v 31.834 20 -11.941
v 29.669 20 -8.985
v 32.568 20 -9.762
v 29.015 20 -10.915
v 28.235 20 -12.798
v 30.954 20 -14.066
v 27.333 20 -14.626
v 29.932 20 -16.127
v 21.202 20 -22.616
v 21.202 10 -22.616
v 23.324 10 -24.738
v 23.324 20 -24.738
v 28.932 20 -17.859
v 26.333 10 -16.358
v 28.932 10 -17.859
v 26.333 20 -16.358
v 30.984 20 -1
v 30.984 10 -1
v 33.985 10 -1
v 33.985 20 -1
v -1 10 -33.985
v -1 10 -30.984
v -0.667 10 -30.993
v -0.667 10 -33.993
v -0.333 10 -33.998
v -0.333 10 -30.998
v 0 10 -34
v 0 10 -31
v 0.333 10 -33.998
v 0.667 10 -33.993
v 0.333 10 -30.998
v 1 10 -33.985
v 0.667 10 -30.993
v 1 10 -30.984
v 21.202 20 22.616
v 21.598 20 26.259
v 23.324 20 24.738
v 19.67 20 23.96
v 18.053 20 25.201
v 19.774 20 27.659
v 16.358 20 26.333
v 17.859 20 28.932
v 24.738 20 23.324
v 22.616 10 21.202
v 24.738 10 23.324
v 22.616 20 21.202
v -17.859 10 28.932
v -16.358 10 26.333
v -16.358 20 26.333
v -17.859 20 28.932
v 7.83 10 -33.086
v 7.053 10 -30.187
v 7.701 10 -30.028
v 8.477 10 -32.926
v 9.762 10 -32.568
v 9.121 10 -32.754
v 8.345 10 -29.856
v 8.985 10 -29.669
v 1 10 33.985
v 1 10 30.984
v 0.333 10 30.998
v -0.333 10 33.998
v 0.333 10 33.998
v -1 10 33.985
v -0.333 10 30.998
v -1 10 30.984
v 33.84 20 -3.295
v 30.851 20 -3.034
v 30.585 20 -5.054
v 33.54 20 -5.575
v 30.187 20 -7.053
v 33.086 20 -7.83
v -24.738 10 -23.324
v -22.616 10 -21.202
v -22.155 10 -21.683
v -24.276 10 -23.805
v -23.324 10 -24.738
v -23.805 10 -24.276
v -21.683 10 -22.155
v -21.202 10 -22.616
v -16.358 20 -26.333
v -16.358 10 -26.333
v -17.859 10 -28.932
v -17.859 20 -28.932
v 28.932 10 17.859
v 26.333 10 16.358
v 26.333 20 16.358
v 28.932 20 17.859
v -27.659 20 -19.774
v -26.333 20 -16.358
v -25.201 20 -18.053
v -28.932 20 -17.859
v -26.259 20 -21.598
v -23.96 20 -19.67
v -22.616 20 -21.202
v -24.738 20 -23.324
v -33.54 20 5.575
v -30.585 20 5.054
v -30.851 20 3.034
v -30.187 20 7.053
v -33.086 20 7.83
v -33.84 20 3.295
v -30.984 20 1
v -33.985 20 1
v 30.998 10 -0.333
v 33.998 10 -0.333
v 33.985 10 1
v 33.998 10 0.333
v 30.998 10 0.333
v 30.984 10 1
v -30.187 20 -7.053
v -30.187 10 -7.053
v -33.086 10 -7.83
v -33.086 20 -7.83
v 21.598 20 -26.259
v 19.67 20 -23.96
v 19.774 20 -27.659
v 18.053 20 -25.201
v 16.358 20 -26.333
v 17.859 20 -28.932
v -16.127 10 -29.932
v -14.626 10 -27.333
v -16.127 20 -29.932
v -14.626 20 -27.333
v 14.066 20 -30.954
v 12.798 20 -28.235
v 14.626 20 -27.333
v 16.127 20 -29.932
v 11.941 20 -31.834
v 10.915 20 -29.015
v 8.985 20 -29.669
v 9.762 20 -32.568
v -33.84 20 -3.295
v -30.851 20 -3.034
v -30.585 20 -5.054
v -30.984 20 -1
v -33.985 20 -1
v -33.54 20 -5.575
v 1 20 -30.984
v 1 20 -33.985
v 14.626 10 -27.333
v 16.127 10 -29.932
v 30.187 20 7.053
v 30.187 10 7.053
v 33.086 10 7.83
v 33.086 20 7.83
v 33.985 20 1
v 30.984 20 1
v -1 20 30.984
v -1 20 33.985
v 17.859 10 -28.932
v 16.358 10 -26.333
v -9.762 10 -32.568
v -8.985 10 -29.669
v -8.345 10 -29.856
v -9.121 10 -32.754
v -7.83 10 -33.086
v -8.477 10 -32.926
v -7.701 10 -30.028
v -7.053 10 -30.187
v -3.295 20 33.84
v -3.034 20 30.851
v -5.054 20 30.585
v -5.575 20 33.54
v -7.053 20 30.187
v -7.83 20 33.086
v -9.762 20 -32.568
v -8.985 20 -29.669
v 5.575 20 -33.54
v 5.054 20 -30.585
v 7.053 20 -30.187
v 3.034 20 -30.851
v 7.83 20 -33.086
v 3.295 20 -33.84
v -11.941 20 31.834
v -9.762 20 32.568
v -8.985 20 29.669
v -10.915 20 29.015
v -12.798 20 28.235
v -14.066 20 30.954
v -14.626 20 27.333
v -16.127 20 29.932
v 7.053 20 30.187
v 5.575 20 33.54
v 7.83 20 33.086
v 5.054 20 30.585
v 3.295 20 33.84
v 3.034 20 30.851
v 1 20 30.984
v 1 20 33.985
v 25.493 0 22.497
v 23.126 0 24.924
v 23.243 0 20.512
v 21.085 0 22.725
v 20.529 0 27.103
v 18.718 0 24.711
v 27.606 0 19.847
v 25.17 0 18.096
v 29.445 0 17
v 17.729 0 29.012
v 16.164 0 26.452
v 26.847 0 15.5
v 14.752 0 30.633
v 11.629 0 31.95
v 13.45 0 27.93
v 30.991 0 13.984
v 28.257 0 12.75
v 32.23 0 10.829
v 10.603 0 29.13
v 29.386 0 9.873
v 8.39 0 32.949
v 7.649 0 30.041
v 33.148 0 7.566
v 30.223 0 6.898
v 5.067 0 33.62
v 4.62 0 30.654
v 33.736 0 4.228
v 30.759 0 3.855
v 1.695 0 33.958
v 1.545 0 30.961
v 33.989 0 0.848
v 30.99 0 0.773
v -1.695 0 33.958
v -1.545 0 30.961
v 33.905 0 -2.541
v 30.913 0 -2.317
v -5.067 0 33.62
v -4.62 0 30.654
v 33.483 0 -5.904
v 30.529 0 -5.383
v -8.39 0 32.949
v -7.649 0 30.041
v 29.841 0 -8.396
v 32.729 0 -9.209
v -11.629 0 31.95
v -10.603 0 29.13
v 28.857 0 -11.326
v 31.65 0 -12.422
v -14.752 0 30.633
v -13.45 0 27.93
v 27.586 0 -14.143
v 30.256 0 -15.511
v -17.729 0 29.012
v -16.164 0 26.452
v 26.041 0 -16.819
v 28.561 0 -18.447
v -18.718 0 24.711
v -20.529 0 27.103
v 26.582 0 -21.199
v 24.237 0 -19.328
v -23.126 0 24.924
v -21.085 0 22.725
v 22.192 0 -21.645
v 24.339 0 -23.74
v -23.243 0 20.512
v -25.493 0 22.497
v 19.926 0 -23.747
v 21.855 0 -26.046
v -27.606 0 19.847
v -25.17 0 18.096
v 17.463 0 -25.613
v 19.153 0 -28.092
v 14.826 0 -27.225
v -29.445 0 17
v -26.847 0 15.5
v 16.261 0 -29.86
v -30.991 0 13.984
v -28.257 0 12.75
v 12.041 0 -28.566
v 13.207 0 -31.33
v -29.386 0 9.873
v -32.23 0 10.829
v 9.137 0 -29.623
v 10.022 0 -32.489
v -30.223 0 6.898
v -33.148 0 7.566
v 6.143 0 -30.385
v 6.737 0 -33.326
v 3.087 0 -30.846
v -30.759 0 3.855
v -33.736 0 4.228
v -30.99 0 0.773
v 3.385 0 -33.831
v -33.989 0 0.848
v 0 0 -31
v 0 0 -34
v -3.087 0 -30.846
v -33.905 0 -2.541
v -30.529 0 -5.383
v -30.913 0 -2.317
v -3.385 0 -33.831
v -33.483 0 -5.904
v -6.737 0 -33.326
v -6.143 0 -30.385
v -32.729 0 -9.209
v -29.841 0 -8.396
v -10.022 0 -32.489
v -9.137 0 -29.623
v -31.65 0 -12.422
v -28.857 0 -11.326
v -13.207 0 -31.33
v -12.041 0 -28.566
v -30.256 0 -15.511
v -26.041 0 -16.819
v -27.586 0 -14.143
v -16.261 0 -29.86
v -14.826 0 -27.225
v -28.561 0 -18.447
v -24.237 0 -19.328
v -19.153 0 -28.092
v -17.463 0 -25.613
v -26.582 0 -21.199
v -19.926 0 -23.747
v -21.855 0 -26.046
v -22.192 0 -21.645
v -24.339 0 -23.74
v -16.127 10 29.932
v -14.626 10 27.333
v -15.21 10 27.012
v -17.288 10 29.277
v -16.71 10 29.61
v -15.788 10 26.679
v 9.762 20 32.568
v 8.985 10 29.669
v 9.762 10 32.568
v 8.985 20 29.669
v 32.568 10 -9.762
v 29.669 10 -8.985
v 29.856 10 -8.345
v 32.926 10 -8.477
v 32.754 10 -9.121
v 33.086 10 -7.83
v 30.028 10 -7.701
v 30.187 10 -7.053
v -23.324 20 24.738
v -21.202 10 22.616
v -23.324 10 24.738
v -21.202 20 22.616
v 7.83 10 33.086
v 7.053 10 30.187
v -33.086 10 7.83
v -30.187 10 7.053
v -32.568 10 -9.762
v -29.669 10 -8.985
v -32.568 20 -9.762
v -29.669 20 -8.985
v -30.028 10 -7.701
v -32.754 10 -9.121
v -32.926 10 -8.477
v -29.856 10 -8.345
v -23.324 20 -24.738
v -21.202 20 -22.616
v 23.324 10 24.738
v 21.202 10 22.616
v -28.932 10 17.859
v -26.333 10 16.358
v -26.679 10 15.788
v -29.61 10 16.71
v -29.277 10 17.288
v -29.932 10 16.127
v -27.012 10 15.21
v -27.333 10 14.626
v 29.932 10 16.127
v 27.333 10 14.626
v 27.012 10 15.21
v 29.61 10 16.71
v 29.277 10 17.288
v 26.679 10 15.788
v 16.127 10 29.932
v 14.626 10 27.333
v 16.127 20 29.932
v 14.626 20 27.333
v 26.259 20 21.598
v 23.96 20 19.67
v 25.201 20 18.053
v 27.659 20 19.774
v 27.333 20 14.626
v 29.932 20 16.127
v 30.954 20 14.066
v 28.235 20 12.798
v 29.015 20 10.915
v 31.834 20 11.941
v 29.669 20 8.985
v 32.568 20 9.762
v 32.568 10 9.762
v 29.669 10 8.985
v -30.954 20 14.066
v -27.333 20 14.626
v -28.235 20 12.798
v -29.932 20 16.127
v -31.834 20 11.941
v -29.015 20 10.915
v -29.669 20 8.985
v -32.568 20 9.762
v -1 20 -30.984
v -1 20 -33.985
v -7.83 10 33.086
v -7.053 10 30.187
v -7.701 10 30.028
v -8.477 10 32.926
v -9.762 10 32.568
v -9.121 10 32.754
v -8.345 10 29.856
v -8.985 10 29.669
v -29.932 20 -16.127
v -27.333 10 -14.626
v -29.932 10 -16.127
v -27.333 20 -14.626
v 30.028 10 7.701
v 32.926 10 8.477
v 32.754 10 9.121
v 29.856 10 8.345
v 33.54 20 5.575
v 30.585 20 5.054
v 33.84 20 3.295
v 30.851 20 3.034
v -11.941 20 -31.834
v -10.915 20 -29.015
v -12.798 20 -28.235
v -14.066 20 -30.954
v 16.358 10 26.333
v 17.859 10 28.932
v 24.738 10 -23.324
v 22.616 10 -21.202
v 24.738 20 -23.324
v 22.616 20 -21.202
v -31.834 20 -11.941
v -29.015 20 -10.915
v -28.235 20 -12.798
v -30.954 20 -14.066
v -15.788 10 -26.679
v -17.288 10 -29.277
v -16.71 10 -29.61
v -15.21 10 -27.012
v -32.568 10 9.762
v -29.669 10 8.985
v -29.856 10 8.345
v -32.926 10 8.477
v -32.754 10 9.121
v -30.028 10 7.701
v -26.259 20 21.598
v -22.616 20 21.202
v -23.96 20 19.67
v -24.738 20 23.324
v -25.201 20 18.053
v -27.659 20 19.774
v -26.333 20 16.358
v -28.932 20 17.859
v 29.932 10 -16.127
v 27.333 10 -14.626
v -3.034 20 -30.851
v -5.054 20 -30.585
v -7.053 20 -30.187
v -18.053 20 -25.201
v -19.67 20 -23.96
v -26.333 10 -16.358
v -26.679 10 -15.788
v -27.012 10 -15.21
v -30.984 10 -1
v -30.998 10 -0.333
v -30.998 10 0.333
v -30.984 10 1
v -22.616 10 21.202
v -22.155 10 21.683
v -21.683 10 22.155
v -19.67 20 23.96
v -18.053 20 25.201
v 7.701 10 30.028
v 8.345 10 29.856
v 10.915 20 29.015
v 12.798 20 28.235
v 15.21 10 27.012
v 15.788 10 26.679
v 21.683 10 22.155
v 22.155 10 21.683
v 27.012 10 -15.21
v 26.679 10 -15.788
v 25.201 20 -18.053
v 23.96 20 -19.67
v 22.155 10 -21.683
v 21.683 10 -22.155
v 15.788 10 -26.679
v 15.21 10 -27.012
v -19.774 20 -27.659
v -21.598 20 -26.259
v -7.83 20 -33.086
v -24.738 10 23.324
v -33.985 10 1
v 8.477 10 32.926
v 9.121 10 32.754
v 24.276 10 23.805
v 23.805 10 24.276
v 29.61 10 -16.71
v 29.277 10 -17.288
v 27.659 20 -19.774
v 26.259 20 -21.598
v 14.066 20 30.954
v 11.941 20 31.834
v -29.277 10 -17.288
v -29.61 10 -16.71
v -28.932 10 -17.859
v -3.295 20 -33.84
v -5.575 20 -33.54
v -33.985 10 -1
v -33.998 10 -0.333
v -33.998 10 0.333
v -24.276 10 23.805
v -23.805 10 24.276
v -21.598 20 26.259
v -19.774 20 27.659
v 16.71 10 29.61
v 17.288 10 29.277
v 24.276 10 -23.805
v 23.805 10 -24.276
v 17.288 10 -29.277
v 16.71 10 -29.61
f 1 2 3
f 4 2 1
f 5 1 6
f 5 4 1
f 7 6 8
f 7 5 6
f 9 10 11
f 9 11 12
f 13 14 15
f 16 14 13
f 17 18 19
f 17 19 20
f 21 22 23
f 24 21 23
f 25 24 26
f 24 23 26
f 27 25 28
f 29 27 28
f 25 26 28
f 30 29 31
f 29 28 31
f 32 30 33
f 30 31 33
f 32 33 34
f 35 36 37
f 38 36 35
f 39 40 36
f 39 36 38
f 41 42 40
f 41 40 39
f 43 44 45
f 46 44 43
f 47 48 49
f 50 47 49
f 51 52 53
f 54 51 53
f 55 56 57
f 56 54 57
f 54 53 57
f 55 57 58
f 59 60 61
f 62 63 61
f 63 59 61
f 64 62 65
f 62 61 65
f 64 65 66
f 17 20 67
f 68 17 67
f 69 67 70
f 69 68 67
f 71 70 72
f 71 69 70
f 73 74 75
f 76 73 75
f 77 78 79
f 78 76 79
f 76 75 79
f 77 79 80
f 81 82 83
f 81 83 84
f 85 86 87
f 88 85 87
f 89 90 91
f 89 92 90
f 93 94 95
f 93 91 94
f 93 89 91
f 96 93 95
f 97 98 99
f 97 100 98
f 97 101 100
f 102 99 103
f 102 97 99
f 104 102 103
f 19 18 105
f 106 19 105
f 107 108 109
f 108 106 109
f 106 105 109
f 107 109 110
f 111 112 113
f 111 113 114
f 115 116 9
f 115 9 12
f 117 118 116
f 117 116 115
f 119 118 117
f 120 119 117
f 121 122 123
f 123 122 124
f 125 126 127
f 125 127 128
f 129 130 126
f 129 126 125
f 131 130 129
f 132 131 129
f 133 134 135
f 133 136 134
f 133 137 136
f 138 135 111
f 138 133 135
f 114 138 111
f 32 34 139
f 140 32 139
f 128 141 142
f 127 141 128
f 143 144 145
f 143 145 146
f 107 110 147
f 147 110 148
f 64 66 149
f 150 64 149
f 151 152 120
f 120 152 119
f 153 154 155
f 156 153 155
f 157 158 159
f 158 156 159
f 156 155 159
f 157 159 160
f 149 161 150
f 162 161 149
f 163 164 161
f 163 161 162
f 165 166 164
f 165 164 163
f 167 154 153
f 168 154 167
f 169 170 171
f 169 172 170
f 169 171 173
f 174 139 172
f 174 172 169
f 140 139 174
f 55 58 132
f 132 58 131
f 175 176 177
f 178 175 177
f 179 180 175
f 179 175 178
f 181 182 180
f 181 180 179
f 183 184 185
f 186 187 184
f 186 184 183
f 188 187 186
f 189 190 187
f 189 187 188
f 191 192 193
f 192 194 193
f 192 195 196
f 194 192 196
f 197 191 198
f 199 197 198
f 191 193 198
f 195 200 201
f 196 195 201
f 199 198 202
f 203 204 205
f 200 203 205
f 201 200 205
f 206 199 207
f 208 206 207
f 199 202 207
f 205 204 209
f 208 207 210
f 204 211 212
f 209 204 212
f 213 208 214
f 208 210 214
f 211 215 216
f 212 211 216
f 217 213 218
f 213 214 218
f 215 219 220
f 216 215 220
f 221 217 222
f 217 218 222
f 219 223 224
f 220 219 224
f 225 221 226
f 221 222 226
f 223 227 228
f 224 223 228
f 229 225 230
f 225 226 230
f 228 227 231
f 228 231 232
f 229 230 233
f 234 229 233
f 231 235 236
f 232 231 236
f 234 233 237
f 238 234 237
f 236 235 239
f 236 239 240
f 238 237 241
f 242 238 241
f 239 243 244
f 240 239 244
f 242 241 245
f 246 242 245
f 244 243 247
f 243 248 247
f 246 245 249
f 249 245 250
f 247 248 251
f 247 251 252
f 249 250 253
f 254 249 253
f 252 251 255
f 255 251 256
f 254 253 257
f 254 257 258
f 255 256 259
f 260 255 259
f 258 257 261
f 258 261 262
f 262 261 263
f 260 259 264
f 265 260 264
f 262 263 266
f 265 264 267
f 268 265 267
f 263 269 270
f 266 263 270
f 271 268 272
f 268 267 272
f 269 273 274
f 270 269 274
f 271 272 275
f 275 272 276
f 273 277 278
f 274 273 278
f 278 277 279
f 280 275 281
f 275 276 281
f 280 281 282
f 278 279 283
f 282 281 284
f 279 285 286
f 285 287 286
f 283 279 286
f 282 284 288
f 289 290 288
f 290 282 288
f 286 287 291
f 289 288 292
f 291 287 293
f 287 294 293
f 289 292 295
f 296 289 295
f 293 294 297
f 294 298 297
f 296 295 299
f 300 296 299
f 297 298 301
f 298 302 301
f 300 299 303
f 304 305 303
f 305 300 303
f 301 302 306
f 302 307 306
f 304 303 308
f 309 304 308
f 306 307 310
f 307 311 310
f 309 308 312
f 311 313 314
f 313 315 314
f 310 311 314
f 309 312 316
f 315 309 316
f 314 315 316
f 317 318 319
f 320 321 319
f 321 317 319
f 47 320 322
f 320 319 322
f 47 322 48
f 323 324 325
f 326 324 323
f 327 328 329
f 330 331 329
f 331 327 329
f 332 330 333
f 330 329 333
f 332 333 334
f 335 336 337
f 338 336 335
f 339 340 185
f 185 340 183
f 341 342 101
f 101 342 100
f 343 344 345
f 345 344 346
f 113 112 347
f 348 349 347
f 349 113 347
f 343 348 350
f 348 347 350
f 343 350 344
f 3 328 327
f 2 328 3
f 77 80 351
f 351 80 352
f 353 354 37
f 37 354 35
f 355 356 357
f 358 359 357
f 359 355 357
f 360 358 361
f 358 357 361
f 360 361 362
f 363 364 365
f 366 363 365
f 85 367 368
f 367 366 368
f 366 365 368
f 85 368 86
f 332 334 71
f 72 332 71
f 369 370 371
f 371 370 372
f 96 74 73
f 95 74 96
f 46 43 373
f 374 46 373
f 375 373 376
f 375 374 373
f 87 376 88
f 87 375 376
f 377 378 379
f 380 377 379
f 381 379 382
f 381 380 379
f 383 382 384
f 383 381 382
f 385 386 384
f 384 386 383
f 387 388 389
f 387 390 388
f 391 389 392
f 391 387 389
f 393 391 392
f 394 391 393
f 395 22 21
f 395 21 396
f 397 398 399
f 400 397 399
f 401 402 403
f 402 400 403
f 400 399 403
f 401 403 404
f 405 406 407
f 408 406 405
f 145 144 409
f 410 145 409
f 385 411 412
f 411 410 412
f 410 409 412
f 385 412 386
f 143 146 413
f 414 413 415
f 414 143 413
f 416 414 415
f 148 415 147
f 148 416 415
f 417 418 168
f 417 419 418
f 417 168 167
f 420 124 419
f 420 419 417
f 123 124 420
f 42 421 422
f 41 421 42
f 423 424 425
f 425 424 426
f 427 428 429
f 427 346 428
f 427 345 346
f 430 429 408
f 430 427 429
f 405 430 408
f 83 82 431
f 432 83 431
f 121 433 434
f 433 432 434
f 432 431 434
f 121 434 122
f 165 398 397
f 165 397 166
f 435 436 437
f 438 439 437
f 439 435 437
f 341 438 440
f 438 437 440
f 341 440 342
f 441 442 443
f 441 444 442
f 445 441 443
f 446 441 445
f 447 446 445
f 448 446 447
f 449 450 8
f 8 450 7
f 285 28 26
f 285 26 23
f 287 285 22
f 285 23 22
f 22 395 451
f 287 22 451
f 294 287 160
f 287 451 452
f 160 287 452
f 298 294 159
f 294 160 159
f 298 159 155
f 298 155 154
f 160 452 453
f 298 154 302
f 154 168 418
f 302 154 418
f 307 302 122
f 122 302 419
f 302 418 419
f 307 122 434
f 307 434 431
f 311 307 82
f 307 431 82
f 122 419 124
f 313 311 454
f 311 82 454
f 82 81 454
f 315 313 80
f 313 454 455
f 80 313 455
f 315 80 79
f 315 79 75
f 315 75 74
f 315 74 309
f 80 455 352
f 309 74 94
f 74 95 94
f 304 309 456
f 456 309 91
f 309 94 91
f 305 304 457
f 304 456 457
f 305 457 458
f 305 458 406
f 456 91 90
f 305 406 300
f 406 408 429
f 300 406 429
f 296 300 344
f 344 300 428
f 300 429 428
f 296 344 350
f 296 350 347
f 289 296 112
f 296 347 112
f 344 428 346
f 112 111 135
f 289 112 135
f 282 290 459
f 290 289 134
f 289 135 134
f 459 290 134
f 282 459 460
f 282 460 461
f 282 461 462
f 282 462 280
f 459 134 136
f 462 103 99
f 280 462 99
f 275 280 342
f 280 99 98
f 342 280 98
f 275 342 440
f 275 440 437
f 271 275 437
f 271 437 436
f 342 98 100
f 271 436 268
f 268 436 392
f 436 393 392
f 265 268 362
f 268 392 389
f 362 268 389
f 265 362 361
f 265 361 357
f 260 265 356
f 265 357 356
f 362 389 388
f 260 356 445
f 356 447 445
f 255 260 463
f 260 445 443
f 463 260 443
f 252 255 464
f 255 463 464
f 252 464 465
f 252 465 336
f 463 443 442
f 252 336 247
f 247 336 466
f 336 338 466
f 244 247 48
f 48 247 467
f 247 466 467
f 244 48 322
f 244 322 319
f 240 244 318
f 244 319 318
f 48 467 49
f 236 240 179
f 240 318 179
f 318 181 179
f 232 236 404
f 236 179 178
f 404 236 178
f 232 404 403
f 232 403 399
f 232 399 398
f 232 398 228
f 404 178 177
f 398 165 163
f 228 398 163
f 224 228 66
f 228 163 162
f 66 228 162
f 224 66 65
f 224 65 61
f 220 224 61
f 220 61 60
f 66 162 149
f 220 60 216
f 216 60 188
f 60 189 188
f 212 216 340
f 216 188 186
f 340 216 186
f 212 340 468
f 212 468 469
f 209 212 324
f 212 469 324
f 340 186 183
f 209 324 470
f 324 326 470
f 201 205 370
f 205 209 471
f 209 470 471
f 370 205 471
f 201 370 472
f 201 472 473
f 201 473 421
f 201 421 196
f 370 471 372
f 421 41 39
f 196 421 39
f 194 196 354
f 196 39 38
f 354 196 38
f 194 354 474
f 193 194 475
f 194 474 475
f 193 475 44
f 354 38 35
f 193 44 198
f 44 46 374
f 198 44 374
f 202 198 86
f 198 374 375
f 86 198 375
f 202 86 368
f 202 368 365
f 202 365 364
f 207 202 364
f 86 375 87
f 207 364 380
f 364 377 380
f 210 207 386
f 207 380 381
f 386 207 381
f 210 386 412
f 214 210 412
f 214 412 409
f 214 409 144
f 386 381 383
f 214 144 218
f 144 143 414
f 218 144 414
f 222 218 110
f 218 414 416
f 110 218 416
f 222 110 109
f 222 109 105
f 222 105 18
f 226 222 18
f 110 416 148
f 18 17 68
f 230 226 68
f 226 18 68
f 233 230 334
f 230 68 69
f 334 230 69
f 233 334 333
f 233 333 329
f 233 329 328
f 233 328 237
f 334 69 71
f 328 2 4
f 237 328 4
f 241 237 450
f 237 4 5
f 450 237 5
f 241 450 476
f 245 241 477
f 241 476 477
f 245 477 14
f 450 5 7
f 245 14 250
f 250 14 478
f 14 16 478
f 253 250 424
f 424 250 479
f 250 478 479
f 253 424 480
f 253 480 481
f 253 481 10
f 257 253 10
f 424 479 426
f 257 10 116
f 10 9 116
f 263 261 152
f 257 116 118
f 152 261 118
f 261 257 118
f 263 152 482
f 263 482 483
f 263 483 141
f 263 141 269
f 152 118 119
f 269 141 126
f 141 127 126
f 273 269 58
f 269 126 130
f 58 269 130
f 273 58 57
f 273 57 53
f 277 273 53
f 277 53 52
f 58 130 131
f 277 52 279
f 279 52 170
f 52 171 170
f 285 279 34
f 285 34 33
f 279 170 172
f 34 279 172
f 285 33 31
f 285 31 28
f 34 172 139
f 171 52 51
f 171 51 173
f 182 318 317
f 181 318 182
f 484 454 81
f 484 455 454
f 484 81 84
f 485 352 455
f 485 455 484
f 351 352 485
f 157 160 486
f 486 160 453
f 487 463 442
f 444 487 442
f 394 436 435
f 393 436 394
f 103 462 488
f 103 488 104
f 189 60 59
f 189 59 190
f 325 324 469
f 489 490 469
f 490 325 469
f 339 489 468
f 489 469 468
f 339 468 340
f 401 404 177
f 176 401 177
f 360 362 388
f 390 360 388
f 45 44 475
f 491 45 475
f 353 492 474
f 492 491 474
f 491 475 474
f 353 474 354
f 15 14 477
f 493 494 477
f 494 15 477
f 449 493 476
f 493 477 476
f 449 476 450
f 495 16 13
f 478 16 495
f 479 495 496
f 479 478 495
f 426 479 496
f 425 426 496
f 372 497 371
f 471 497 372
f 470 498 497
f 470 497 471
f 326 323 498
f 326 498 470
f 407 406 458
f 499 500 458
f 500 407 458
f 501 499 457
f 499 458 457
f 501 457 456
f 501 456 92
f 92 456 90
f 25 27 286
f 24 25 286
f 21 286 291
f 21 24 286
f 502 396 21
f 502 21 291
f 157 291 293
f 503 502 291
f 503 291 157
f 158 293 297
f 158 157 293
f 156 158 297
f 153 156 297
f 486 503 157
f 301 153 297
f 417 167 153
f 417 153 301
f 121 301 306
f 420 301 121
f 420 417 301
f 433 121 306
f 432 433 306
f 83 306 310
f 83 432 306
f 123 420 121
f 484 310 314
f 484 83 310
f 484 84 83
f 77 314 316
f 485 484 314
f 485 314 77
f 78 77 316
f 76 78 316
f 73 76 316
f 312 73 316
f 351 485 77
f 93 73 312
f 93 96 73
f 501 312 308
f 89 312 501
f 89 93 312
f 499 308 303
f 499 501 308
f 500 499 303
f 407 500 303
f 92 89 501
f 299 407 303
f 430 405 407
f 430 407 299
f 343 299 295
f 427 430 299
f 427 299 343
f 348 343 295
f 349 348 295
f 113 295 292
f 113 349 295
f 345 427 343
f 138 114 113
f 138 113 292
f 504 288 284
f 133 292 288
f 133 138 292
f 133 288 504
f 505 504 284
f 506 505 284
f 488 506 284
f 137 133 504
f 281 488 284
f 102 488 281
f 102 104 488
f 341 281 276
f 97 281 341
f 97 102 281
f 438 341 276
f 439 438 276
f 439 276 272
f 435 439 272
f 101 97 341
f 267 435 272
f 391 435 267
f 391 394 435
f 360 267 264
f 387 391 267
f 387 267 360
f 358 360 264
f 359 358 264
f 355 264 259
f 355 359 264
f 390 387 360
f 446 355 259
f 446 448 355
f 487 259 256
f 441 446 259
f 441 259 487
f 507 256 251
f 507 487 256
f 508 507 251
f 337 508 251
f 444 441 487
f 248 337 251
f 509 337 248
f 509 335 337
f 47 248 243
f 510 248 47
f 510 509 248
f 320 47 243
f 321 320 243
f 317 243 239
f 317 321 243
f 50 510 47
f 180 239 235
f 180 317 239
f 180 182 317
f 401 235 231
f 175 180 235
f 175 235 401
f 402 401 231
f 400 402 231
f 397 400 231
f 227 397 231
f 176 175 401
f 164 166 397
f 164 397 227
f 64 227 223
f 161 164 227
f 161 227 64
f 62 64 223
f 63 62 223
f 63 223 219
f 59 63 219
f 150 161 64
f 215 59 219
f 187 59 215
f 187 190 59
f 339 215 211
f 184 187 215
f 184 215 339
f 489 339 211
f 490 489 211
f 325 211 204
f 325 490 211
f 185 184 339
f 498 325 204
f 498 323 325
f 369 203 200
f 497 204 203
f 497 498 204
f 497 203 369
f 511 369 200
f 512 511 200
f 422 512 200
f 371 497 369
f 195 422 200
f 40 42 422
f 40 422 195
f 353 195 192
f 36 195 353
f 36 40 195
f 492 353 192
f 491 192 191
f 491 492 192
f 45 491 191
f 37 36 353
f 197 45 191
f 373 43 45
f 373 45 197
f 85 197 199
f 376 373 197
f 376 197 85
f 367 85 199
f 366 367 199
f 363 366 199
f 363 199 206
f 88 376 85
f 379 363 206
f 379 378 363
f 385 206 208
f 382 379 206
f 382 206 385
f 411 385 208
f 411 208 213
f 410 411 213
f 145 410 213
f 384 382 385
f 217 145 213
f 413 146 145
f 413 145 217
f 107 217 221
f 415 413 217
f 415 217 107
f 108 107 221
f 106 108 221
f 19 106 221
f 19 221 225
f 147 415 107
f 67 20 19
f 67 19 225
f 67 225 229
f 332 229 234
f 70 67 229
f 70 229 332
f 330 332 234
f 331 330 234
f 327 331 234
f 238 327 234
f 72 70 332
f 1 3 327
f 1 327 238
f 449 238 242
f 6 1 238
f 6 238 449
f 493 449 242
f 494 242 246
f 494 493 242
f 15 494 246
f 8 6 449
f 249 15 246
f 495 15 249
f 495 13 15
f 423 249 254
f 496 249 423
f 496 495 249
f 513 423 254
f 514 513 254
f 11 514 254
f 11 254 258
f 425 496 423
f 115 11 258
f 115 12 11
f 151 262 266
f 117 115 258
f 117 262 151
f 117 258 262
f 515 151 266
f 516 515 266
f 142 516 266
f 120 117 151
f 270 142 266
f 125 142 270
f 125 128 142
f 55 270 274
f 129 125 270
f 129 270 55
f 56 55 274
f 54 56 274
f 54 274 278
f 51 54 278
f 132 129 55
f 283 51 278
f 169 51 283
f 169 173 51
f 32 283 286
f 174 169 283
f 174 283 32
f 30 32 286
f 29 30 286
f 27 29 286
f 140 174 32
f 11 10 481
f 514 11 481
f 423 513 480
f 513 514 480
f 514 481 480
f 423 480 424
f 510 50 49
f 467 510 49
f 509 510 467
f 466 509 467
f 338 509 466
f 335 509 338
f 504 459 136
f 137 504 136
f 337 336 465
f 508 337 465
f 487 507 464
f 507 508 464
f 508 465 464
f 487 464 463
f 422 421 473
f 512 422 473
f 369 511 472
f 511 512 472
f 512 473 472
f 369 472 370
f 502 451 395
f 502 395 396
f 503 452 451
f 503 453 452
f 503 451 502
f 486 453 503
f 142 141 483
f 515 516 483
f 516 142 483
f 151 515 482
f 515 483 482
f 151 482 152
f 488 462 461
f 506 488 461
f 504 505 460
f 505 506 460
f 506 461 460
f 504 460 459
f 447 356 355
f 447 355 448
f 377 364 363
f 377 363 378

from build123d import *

# Parameters (mm, degrees)
SKETCH1_W          = 3
SKETCH1_H          = 20
SKETCH2_W          = 2
SKETCH2_H          = 38.722689076
CUT_EXTRUDE1_DEPTH = 40
CIRPATTERN1_COUNT  = 24


with BuildPart() as part:
    # Sketch1 → Revolve1 (revolve)
    with BuildSketch(Plane.XY, mode=Mode.PRIVATE) as revolve1_sk:
        with Locations((-32.5, 10)):
            Rectangle(SKETCH1_W, SKETCH1_H)
    revolve(revolve1_sk.sketch.rotate(Axis((0, -1.909188309, 0), (0, 1, 0)), 270), axis=Axis((0, -1.909188309, 0), (0, 1, 0)))

    # Sketch2 → Cut-Extrude1 (cut)
    with BuildSketch(Plane.XY):
        with Locations((0, 29.361344538)):
            Rectangle(SKETCH2_W, SKETCH2_H)
    cut_extrude1 = extrude(amount=-CUT_EXTRUDE1_DEPTH, mode=Mode.SUBTRACT)

    # CirPattern1: Cut-Extrude1 ×24 about axis
    cirpattern1_axis = Axis((0, 0, 0), (0, 1, 0))
    for i in range(1, CIRPATTERN1_COUNT):
        add(cut_extrude1.rotate(cirpattern1_axis, i * 360 / CIRPATTERN1_COUNT), mode=Mode.SUBTRACT)


solid = part.part
